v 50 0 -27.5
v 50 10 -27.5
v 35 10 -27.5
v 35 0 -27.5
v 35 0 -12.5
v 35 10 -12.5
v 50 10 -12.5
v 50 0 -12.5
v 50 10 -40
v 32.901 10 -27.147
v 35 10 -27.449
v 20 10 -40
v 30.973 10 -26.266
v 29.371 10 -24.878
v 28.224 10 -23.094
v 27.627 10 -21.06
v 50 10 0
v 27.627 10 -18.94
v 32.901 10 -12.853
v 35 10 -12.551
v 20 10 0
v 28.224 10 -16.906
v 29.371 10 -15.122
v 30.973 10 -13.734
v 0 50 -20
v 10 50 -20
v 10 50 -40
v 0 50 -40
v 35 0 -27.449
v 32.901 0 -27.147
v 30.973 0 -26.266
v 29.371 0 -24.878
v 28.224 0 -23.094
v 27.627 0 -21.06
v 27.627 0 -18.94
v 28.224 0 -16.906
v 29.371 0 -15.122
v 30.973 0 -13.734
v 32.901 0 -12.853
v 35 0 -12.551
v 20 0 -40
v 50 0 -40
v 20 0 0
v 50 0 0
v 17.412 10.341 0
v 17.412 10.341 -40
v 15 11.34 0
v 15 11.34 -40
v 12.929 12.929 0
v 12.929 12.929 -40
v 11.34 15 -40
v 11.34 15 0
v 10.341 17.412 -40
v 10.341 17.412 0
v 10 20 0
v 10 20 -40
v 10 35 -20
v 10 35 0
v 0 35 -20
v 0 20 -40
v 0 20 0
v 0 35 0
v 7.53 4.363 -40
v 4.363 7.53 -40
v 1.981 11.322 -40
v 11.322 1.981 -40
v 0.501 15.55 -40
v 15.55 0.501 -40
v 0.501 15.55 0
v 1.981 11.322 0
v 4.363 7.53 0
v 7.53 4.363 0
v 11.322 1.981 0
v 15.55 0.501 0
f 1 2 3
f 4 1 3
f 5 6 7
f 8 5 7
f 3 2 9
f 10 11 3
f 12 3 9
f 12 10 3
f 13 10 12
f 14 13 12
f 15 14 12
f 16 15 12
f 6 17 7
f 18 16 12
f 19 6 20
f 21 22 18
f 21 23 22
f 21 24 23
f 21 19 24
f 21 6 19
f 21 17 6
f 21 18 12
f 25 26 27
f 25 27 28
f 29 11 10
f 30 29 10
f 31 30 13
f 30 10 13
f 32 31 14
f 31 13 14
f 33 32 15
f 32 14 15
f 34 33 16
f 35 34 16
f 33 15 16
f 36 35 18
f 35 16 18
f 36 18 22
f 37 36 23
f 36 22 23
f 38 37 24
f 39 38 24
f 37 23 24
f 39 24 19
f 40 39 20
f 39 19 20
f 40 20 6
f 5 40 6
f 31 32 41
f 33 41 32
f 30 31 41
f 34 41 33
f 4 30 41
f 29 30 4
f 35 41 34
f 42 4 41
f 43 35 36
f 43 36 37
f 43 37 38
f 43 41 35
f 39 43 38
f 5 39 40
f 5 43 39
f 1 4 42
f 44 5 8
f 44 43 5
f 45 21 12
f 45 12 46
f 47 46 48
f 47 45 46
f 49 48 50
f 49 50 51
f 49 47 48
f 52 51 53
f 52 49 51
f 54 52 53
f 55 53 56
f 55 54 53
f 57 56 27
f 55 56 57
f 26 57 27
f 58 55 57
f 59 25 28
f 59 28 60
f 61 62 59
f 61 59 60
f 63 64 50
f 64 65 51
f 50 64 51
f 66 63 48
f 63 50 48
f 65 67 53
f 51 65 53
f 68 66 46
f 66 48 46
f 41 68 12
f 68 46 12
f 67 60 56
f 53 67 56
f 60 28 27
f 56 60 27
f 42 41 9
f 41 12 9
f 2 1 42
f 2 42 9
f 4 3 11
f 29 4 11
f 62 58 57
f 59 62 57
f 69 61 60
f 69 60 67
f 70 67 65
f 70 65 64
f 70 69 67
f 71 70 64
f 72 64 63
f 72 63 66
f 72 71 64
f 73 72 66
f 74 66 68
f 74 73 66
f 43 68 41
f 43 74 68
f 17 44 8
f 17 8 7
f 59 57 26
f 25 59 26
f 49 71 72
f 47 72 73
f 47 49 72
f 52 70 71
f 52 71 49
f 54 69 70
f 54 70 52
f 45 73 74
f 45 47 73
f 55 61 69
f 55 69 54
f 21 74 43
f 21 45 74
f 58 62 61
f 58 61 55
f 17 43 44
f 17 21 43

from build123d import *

# Parameters (mm, degrees)
BOSS_EXTRUDE1_DEPTH     = 40
SKETCH3_W               = 20
SKETCH3_H               = 15
CUT_EXTRUDE1_DEPTH      = 10
CUT_EXTRUDE5_DEPTH      = 41
CUT_EXTRUDE5_DEPTH_BACK = 10


with BuildPart() as part:
    # Sketch1 → Boss-Extrude1 (new body)
    with BuildSketch(Plane.XY):
        with BuildLine():
            Line((20, 0), (50, 0))
            Line((50, 0), (50, 10))
            Line((50, 10), (20, 10))
            ThreePointArc((20, 10), (12.928932188, 12.928932188), (10, 20))
            Line((10, 20), (10, 50))
            Line((10, 50), (0, 50))
            Line((0, 50), (0, 20))
            ThreePointArc((0, 20), (5.857864376, 5.857864376), (20, 0))
        make_face()
    extrude(amount=-BOSS_EXTRUDE1_DEPTH)

    # Sketch3 → Cut-Extrude1 (cut)
    with BuildSketch(Plane(origin=(10, 0, 0), x_dir=(0, 0, -1), z_dir=(1, 0, 0))):
        with Locations((10, 42.5)):
            Rectangle(SKETCH3_W, SKETCH3_H)
    extrude(amount=-CUT_EXTRUDE1_DEPTH, mode=Mode.SUBTRACT)

    # Sketch4 → Cut-Extrude5 (cut, two sides)
    with BuildSketch(Plane(origin=(0, 10, 0), x_dir=(1, 0, 0), z_dir=(0, 1, 0))) as cut_extrude5_sk:
        with BuildLine():
            Line((174.127122105, 27.5), (50, 27.5))
            Line((50, 27.5), (35, 27.5))
            Line((35, 27.5), (35, 27.448852076))
            ThreePointArc((35, 27.448852076), (27.551147924, 20), (35, 12.551147924))
            Line((35, 12.551147924), (35, 12.5))
            Line((35, 12.5), (50, 12.5))
            Line((50, 12.5), (174.127122105, 12.5))
            Line((174.127122105, 12.5), (422.381366315, 12.5))
            Line((422.381366315, 12.5), (422.381366315, 27.5))
            Line((422.381366315, 27.5), (174.127122105, 27.5))
        make_face()
    extrude(amount=CUT_EXTRUDE5_DEPTH, mode=Mode.SUBTRACT)
    extrude(cut_extrude5_sk.sketch, amount=-CUT_EXTRUDE5_DEPTH_BACK, mode=Mode.SUBTRACT)


solid = part.part
